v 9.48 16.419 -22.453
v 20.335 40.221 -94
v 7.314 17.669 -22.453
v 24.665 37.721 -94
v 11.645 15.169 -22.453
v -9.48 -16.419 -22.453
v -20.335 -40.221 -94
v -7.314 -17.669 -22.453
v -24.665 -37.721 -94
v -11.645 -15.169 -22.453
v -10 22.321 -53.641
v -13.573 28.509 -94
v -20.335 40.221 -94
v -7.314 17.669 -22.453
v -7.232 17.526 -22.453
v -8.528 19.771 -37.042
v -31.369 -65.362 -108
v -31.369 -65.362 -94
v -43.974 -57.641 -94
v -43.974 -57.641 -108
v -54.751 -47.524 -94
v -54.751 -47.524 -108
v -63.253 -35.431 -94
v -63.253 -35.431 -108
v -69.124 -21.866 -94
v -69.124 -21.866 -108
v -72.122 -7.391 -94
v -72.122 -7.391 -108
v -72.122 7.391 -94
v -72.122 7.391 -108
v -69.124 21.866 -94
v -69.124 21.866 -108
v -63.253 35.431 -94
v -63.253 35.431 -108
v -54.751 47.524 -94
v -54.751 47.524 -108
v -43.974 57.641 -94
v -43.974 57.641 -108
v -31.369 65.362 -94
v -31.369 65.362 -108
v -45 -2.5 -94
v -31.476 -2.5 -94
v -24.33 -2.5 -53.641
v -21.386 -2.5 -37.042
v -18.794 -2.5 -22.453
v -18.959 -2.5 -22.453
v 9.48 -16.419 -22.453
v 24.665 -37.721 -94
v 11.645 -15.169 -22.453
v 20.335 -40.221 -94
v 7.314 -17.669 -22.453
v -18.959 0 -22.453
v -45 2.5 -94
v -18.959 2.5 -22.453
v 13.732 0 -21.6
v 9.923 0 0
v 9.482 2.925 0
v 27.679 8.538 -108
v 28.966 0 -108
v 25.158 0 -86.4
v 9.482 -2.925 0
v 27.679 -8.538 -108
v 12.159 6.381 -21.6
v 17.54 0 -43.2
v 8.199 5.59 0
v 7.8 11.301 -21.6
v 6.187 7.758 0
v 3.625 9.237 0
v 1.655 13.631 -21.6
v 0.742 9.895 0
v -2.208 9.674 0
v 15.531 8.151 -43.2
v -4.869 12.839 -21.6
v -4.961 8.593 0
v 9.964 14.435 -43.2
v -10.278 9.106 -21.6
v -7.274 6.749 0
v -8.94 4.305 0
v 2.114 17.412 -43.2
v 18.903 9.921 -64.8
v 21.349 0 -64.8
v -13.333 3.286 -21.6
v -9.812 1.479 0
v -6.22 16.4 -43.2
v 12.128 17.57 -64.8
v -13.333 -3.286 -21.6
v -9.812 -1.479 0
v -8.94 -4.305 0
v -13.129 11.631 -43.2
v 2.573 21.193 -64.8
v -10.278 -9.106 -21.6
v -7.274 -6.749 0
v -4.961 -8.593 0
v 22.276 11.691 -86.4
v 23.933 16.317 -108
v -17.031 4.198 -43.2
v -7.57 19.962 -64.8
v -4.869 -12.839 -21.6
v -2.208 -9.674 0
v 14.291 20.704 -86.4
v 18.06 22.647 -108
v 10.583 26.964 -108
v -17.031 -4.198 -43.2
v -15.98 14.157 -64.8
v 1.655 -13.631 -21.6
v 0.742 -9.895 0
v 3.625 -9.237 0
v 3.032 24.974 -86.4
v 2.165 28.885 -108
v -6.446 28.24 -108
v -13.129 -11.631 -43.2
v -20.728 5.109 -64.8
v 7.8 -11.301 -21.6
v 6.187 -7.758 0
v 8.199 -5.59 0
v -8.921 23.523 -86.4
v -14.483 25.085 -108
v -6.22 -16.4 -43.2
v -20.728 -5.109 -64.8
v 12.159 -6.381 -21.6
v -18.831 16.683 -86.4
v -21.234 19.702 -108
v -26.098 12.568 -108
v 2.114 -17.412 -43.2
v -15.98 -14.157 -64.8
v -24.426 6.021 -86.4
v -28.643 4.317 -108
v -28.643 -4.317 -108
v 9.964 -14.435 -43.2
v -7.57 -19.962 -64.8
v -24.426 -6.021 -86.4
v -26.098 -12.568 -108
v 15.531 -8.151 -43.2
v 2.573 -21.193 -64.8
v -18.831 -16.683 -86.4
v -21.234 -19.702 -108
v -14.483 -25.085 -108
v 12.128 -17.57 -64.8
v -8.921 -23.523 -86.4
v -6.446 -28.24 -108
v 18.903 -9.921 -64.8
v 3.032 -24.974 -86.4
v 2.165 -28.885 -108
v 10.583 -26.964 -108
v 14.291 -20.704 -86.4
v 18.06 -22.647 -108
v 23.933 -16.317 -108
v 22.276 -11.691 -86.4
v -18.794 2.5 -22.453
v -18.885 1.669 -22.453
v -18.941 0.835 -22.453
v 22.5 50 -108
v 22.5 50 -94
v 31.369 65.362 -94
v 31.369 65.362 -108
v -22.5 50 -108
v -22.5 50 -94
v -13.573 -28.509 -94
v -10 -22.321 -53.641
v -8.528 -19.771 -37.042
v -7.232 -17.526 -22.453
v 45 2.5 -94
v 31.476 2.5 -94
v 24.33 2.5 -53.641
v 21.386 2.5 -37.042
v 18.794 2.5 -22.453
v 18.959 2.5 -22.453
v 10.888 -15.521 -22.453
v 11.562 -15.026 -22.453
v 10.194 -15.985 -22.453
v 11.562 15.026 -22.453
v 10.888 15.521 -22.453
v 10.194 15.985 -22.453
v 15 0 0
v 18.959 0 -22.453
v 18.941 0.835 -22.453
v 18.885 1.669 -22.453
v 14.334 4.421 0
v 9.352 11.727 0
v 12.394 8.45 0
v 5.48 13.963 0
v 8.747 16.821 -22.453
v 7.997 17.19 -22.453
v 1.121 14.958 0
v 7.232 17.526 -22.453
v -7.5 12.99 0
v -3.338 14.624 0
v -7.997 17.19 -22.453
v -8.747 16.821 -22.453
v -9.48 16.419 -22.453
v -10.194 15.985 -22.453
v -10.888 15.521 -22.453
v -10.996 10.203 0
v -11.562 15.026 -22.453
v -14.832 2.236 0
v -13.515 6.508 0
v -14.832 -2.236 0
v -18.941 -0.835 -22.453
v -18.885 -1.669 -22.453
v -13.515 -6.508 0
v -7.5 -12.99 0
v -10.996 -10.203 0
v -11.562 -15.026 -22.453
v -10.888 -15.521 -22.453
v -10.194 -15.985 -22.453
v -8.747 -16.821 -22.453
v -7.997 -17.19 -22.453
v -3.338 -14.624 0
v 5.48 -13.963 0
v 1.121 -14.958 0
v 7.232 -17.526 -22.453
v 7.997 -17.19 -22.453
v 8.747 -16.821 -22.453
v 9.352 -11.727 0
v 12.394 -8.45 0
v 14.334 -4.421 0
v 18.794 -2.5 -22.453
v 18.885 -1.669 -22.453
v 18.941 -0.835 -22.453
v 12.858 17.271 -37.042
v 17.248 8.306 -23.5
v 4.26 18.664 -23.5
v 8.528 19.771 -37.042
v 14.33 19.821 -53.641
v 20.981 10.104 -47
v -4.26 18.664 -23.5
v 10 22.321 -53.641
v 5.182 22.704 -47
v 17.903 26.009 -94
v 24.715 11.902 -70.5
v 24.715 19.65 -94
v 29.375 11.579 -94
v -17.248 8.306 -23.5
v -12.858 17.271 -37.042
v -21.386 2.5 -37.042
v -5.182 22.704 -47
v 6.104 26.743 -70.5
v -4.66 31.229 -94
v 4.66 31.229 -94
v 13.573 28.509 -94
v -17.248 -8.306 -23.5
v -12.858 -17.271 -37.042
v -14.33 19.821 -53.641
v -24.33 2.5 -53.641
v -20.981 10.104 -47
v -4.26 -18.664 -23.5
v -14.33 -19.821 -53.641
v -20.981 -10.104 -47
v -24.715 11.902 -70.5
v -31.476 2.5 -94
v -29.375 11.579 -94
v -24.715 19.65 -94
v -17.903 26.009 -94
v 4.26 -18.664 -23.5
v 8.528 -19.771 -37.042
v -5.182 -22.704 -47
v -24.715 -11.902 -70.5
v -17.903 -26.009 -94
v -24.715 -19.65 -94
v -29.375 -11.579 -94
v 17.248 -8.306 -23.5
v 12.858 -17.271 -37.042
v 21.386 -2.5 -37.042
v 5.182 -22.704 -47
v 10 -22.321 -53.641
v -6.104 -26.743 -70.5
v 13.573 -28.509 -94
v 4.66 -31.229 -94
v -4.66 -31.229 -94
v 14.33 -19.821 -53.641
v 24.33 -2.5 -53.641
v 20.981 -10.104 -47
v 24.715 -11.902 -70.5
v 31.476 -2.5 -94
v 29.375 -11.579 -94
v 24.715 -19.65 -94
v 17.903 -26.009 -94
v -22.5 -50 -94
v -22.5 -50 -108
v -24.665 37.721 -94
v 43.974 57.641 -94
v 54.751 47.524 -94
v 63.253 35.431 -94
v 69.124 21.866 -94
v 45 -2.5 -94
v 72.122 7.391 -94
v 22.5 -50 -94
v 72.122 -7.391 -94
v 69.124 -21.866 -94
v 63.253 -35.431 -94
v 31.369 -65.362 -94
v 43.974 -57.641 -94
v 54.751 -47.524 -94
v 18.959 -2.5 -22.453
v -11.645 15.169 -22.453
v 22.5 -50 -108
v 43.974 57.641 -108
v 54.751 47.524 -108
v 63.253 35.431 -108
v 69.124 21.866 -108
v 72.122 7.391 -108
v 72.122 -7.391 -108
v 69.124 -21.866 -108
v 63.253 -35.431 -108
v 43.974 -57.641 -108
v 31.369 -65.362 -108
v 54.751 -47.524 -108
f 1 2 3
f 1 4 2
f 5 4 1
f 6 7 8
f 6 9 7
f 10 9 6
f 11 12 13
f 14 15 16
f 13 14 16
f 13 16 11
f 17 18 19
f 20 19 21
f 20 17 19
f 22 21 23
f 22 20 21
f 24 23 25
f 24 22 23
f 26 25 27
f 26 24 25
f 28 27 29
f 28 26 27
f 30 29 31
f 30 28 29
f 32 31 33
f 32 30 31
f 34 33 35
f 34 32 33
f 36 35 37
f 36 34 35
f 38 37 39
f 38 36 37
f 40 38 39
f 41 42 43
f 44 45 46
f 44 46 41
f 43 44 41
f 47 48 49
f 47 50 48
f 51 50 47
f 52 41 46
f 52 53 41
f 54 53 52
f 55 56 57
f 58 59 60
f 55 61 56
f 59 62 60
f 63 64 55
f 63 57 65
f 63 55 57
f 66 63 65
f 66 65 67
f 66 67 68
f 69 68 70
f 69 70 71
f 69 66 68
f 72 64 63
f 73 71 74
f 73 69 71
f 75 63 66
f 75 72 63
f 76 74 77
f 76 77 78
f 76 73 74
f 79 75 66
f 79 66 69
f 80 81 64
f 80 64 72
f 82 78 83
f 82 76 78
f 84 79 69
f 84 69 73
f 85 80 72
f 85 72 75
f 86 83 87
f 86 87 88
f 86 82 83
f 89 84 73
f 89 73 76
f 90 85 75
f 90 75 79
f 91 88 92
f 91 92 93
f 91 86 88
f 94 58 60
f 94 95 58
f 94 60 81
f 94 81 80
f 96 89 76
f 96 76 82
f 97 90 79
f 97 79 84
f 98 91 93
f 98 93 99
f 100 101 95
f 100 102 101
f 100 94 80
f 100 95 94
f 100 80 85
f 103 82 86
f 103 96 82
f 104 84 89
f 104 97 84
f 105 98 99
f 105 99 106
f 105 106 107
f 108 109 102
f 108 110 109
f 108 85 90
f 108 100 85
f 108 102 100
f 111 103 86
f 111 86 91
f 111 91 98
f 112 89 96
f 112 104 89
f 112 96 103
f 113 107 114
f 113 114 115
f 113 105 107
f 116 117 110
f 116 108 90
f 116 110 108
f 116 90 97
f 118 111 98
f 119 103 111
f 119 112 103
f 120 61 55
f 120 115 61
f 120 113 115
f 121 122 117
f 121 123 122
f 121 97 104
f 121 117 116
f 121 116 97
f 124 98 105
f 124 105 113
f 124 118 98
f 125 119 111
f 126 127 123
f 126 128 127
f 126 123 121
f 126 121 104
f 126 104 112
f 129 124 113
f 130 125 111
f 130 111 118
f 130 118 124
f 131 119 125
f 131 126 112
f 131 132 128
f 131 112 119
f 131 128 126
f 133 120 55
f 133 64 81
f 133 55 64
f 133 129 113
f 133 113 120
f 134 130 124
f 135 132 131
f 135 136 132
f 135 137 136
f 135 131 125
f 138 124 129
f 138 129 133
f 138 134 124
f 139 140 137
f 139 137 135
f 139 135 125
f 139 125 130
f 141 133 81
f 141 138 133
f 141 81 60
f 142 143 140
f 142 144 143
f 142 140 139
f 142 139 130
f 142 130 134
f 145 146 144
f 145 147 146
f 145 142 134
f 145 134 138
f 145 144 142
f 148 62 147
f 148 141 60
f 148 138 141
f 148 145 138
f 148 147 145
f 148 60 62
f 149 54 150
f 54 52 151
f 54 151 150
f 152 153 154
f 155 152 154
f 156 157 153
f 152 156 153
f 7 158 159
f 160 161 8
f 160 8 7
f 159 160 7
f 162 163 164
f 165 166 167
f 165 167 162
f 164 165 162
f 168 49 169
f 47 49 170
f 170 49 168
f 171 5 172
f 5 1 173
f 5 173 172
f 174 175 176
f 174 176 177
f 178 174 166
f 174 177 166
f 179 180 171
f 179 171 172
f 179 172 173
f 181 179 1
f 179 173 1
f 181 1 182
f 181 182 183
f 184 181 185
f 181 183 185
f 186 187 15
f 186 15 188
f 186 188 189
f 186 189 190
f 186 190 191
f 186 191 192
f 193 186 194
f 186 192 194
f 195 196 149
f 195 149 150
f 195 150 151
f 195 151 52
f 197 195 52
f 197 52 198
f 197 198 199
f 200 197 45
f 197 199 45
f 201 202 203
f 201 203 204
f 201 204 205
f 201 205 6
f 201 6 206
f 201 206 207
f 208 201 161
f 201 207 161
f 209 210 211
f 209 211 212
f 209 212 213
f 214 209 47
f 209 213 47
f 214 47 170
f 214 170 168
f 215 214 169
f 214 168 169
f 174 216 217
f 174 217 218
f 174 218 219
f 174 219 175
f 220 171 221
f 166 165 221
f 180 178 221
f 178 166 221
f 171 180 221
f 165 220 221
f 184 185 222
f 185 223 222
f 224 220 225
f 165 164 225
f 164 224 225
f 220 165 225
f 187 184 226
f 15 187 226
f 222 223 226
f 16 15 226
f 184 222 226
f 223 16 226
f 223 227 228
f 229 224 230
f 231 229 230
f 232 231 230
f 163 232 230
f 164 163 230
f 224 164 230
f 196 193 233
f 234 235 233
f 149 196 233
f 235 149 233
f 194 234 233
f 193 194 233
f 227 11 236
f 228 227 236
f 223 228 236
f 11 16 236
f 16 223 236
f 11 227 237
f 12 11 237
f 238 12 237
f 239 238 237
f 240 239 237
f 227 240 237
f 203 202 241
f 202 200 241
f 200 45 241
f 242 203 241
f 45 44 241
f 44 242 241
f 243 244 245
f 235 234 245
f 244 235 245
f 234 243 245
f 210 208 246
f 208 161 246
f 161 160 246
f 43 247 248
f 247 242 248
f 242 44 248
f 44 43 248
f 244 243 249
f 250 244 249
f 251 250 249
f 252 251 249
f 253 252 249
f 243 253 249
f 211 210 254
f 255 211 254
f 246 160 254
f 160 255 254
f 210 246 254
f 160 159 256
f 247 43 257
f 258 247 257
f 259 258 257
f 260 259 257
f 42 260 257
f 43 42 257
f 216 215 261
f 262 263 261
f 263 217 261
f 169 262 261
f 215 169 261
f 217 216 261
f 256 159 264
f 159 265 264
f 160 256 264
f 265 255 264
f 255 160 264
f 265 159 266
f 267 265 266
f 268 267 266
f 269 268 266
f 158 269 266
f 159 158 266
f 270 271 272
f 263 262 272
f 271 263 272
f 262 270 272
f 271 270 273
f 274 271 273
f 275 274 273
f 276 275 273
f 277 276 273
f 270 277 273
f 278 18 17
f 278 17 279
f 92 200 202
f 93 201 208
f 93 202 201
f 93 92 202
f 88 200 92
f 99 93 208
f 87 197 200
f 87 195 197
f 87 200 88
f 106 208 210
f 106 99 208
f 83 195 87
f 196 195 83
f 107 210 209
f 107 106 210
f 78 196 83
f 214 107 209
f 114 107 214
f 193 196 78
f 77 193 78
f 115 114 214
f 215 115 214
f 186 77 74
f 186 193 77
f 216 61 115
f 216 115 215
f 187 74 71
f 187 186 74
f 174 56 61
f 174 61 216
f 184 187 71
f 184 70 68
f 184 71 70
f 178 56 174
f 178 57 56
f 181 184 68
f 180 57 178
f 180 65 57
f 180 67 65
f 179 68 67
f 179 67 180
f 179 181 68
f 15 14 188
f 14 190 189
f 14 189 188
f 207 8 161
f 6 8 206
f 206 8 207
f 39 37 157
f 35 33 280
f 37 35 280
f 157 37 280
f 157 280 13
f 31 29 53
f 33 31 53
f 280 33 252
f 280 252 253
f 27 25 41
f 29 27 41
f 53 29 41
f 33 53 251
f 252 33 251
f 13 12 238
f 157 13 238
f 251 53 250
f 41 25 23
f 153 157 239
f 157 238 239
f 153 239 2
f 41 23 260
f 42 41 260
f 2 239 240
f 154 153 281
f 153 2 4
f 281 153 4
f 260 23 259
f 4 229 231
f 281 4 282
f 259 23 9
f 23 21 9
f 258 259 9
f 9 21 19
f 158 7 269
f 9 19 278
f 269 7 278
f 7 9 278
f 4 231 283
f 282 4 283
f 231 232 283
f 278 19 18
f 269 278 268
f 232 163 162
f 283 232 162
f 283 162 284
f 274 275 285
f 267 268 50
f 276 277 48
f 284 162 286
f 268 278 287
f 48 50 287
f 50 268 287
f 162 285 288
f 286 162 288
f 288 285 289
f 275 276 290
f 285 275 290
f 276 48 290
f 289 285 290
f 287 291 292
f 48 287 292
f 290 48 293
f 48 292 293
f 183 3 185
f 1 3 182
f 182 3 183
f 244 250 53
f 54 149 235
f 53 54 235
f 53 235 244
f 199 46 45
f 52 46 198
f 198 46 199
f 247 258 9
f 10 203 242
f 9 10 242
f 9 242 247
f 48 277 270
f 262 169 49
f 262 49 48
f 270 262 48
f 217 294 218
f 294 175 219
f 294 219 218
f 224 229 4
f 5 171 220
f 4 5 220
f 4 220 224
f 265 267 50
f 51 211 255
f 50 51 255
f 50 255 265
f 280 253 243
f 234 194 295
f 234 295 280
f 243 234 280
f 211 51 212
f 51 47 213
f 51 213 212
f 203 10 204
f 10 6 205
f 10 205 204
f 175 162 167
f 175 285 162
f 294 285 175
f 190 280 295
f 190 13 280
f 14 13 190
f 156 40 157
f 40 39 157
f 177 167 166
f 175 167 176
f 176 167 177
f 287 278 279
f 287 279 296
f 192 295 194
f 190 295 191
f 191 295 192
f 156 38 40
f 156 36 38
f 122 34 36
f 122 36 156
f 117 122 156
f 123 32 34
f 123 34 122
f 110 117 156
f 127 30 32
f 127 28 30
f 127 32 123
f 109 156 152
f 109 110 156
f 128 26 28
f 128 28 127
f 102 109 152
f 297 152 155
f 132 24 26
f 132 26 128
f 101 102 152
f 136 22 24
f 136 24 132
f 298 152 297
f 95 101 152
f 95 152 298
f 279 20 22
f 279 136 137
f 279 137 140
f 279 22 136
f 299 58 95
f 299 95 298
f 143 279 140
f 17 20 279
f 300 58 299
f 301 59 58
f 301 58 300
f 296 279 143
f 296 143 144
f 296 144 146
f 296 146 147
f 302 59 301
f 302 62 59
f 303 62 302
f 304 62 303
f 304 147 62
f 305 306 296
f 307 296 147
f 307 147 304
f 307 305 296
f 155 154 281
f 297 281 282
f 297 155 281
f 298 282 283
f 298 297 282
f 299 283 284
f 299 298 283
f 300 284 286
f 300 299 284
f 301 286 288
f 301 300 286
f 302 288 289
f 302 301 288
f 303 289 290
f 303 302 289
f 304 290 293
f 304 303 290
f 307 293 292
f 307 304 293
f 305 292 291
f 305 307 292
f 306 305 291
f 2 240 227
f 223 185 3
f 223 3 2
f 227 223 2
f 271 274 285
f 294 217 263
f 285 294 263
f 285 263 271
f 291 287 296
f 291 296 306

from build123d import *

# Parameters (mm, degrees)
SKETCH_R           = 15
PAD_DEPTH          = 108
PAD_TAPER          = -10
SKETCH001_R        = 72.5
PAD001_DEPTH       = 14
POCKET_DEPTH       = 571.52662
PAD002_DEPTH       = 2.5
POLARPATTERN_COUNT = 6


with BuildPart() as part:
    # Sketch (on XY_Plane of Origin) → Pad (new body)
    with BuildSketch(Plane.XY):
        Circle(SKETCH_R)
    extrude(amount=-PAD_DEPTH, taper=PAD_TAPER)

    # Sketch001 (on Face3 of Pad) → Pad001 (join)
    with BuildSketch(Plane(origin=(0, 0, -108), x_dir=(1, 0, 0), z_dir=(0, 0, -1))):
        Circle(SKETCH001_R)
    extrude(amount=-PAD001_DEPTH)

    # Sketch002 (on XY_Plane of Origin) → Pocket (cut, through all)
    with BuildSketch(Plane.XY):
        with BuildLine():
            Line((-31.369354, -65.362173), (-22.5, -50))
            Line((-22.5, -50), (22.5, -50))
            Line((22.5, -50), (31.369354, -65.362173))
            ThreePointArc((-31.369354, -65.362173), (0, -72.5), (31.369354, -65.362173))
        make_face()
    pocket = extrude(amount=-POCKET_DEPTH, mode=Mode.SUBTRACT)

    # Mirrored: Pocket across XZ
    add(pocket.mirror(Plane.XZ), mode=Mode.SUBTRACT)

    # Sketch003 (on XZ_Plane of Origin) → Groove (revolve, cut)
    with BuildSketch(Plane.XZ):
        Polygon((9.922867, 0), (28.966181, -108), (0, -108), (0, 0), align=None)
    revolve(axis=Axis((0, 0, 0), (0, 0, 1)), mode=Mode.SUBTRACT)

    # Sketch004 (on XZ_Plane of Origin) → Pad002 (join, symmetric)
    with BuildSketch(Plane.XZ):
        Polygon((31.369354, -94), (45, -94), (18.959115, -22.453256), (13.881982, -22.453256), (26.497603, -94), align=None)
    pad002 = extrude(amount=PAD002_DEPTH, both=True)

    # PolarPattern: Pad002 ×6 about axis
    polarpattern_axis = Axis((0, 0, 0), (0, 0, 1))
    for i in range(1, POLARPATTERN_COUNT):
        add(pad002.rotate(polarpattern_axis, i * 360 / POLARPATTERN_COUNT))


solid = part.part
